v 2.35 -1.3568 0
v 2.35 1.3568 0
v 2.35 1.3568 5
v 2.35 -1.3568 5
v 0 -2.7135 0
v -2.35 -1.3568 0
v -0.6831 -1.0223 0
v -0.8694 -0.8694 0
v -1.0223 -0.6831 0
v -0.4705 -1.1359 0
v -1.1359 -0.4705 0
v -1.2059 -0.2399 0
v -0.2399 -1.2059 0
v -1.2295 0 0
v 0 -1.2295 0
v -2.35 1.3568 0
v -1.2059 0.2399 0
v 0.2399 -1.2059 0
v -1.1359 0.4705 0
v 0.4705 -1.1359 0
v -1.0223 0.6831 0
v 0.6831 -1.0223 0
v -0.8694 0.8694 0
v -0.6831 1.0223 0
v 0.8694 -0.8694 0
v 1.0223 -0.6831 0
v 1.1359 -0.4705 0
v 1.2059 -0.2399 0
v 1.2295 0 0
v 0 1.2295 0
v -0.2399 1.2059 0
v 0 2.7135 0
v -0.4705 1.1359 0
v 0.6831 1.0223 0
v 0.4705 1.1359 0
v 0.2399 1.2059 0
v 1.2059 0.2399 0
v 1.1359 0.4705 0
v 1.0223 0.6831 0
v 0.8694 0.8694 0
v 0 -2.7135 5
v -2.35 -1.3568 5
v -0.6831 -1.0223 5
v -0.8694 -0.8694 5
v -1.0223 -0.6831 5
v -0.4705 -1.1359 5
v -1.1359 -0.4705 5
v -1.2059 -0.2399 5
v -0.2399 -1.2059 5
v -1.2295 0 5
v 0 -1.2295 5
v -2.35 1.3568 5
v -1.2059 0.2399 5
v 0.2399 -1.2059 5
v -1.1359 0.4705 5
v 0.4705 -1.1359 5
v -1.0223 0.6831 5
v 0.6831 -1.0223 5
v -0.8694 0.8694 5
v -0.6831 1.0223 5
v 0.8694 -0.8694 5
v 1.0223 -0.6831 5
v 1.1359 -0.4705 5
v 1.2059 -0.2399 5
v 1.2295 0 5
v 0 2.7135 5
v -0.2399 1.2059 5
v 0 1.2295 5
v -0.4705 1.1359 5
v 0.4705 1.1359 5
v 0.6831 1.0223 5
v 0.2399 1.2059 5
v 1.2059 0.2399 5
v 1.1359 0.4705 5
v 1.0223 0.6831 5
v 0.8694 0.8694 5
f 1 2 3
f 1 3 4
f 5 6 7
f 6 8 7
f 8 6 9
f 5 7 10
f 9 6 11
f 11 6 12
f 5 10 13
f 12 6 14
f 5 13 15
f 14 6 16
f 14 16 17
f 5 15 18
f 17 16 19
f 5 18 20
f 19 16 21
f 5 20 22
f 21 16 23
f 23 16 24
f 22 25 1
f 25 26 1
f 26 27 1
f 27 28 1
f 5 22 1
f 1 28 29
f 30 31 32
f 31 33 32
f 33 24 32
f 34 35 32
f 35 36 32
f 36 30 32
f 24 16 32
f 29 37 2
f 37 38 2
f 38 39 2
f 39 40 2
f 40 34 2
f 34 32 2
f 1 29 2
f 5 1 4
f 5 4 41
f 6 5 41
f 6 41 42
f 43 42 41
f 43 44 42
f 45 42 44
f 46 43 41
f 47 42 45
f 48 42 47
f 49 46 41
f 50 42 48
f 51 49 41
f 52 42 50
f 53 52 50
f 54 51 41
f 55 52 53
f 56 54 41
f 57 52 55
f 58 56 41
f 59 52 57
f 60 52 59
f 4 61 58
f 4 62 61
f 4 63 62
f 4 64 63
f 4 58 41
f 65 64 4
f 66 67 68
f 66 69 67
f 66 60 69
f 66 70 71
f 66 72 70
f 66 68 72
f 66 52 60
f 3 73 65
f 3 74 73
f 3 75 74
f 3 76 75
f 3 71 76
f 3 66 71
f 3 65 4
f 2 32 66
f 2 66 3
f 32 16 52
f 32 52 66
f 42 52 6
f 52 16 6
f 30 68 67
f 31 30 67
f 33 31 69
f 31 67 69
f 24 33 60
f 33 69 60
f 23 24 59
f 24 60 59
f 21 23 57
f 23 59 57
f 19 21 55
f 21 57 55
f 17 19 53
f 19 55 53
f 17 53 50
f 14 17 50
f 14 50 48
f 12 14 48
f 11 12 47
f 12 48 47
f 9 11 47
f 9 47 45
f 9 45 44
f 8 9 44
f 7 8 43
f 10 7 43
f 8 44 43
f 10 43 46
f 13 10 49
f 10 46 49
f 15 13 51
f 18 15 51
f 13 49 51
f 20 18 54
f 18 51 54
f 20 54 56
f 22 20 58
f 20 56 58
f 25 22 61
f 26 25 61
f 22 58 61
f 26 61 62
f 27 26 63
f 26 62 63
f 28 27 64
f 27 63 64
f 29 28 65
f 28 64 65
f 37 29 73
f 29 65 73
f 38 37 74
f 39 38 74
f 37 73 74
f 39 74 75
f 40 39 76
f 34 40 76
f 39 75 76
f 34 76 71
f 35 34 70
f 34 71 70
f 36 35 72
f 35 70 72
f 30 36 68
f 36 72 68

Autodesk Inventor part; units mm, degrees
ref_plane "YZ Plane" through (0, 0, 0) normal (1, 0, 0) x (0, 1, 0)
ref_plane "XZ Plane" through (0, 0, 0) normal (0, 1, 0) x (-1, 0, 0)
ref_plane "XY Plane" through (0, 0, 0) normal (0, 0, 1) x (1, 0, 0)
sketch "Sketch1" plane through (0, 0, 0) normal (0, 0, 1) x (1, 0, 0)
  line L0 (2.35, 1.3568) -> (2.35, -1.3568)
  line L1 (2.35, -1.3568) -> (0, -2.7135)
  line L2 (0, -2.7135) -> (-2.35, -1.3568)
  line L3 (-2.35, 1.3568) -> (-2.35, -1.3568)
  line L4 (-2.35, 1.3568) -> (0, 2.7135)
  line L5 (0, 2.7135) -> (2.35, 1.3568)
  circle A0 centre (0, 0) radius 2.7135 construction
  line L6 (0, 29.0365) -> (0, -7.2493) construction
  line L7 (0, -14.5064) -> (0, 36.2936) projected
  line L8 (-3.799, 0) -> (3.799, 0) projected
  dimension "d0" = 5.4271
  dimension "d20" = 4.7
  dimension "d21" = 2.7136
extrude "Hexagon1" add sketch "Sketch1" along normal blind 5
hole "Hole1" at (0, 0, 0) direction (0, 0, 1) diameter 2.459 end through all thread size "M3x0.5" class "6H" standard "ISO Metric profile"
properties part number "Spacer-M3-FF-05" material "Brass, Soft Yellow, Welded"
